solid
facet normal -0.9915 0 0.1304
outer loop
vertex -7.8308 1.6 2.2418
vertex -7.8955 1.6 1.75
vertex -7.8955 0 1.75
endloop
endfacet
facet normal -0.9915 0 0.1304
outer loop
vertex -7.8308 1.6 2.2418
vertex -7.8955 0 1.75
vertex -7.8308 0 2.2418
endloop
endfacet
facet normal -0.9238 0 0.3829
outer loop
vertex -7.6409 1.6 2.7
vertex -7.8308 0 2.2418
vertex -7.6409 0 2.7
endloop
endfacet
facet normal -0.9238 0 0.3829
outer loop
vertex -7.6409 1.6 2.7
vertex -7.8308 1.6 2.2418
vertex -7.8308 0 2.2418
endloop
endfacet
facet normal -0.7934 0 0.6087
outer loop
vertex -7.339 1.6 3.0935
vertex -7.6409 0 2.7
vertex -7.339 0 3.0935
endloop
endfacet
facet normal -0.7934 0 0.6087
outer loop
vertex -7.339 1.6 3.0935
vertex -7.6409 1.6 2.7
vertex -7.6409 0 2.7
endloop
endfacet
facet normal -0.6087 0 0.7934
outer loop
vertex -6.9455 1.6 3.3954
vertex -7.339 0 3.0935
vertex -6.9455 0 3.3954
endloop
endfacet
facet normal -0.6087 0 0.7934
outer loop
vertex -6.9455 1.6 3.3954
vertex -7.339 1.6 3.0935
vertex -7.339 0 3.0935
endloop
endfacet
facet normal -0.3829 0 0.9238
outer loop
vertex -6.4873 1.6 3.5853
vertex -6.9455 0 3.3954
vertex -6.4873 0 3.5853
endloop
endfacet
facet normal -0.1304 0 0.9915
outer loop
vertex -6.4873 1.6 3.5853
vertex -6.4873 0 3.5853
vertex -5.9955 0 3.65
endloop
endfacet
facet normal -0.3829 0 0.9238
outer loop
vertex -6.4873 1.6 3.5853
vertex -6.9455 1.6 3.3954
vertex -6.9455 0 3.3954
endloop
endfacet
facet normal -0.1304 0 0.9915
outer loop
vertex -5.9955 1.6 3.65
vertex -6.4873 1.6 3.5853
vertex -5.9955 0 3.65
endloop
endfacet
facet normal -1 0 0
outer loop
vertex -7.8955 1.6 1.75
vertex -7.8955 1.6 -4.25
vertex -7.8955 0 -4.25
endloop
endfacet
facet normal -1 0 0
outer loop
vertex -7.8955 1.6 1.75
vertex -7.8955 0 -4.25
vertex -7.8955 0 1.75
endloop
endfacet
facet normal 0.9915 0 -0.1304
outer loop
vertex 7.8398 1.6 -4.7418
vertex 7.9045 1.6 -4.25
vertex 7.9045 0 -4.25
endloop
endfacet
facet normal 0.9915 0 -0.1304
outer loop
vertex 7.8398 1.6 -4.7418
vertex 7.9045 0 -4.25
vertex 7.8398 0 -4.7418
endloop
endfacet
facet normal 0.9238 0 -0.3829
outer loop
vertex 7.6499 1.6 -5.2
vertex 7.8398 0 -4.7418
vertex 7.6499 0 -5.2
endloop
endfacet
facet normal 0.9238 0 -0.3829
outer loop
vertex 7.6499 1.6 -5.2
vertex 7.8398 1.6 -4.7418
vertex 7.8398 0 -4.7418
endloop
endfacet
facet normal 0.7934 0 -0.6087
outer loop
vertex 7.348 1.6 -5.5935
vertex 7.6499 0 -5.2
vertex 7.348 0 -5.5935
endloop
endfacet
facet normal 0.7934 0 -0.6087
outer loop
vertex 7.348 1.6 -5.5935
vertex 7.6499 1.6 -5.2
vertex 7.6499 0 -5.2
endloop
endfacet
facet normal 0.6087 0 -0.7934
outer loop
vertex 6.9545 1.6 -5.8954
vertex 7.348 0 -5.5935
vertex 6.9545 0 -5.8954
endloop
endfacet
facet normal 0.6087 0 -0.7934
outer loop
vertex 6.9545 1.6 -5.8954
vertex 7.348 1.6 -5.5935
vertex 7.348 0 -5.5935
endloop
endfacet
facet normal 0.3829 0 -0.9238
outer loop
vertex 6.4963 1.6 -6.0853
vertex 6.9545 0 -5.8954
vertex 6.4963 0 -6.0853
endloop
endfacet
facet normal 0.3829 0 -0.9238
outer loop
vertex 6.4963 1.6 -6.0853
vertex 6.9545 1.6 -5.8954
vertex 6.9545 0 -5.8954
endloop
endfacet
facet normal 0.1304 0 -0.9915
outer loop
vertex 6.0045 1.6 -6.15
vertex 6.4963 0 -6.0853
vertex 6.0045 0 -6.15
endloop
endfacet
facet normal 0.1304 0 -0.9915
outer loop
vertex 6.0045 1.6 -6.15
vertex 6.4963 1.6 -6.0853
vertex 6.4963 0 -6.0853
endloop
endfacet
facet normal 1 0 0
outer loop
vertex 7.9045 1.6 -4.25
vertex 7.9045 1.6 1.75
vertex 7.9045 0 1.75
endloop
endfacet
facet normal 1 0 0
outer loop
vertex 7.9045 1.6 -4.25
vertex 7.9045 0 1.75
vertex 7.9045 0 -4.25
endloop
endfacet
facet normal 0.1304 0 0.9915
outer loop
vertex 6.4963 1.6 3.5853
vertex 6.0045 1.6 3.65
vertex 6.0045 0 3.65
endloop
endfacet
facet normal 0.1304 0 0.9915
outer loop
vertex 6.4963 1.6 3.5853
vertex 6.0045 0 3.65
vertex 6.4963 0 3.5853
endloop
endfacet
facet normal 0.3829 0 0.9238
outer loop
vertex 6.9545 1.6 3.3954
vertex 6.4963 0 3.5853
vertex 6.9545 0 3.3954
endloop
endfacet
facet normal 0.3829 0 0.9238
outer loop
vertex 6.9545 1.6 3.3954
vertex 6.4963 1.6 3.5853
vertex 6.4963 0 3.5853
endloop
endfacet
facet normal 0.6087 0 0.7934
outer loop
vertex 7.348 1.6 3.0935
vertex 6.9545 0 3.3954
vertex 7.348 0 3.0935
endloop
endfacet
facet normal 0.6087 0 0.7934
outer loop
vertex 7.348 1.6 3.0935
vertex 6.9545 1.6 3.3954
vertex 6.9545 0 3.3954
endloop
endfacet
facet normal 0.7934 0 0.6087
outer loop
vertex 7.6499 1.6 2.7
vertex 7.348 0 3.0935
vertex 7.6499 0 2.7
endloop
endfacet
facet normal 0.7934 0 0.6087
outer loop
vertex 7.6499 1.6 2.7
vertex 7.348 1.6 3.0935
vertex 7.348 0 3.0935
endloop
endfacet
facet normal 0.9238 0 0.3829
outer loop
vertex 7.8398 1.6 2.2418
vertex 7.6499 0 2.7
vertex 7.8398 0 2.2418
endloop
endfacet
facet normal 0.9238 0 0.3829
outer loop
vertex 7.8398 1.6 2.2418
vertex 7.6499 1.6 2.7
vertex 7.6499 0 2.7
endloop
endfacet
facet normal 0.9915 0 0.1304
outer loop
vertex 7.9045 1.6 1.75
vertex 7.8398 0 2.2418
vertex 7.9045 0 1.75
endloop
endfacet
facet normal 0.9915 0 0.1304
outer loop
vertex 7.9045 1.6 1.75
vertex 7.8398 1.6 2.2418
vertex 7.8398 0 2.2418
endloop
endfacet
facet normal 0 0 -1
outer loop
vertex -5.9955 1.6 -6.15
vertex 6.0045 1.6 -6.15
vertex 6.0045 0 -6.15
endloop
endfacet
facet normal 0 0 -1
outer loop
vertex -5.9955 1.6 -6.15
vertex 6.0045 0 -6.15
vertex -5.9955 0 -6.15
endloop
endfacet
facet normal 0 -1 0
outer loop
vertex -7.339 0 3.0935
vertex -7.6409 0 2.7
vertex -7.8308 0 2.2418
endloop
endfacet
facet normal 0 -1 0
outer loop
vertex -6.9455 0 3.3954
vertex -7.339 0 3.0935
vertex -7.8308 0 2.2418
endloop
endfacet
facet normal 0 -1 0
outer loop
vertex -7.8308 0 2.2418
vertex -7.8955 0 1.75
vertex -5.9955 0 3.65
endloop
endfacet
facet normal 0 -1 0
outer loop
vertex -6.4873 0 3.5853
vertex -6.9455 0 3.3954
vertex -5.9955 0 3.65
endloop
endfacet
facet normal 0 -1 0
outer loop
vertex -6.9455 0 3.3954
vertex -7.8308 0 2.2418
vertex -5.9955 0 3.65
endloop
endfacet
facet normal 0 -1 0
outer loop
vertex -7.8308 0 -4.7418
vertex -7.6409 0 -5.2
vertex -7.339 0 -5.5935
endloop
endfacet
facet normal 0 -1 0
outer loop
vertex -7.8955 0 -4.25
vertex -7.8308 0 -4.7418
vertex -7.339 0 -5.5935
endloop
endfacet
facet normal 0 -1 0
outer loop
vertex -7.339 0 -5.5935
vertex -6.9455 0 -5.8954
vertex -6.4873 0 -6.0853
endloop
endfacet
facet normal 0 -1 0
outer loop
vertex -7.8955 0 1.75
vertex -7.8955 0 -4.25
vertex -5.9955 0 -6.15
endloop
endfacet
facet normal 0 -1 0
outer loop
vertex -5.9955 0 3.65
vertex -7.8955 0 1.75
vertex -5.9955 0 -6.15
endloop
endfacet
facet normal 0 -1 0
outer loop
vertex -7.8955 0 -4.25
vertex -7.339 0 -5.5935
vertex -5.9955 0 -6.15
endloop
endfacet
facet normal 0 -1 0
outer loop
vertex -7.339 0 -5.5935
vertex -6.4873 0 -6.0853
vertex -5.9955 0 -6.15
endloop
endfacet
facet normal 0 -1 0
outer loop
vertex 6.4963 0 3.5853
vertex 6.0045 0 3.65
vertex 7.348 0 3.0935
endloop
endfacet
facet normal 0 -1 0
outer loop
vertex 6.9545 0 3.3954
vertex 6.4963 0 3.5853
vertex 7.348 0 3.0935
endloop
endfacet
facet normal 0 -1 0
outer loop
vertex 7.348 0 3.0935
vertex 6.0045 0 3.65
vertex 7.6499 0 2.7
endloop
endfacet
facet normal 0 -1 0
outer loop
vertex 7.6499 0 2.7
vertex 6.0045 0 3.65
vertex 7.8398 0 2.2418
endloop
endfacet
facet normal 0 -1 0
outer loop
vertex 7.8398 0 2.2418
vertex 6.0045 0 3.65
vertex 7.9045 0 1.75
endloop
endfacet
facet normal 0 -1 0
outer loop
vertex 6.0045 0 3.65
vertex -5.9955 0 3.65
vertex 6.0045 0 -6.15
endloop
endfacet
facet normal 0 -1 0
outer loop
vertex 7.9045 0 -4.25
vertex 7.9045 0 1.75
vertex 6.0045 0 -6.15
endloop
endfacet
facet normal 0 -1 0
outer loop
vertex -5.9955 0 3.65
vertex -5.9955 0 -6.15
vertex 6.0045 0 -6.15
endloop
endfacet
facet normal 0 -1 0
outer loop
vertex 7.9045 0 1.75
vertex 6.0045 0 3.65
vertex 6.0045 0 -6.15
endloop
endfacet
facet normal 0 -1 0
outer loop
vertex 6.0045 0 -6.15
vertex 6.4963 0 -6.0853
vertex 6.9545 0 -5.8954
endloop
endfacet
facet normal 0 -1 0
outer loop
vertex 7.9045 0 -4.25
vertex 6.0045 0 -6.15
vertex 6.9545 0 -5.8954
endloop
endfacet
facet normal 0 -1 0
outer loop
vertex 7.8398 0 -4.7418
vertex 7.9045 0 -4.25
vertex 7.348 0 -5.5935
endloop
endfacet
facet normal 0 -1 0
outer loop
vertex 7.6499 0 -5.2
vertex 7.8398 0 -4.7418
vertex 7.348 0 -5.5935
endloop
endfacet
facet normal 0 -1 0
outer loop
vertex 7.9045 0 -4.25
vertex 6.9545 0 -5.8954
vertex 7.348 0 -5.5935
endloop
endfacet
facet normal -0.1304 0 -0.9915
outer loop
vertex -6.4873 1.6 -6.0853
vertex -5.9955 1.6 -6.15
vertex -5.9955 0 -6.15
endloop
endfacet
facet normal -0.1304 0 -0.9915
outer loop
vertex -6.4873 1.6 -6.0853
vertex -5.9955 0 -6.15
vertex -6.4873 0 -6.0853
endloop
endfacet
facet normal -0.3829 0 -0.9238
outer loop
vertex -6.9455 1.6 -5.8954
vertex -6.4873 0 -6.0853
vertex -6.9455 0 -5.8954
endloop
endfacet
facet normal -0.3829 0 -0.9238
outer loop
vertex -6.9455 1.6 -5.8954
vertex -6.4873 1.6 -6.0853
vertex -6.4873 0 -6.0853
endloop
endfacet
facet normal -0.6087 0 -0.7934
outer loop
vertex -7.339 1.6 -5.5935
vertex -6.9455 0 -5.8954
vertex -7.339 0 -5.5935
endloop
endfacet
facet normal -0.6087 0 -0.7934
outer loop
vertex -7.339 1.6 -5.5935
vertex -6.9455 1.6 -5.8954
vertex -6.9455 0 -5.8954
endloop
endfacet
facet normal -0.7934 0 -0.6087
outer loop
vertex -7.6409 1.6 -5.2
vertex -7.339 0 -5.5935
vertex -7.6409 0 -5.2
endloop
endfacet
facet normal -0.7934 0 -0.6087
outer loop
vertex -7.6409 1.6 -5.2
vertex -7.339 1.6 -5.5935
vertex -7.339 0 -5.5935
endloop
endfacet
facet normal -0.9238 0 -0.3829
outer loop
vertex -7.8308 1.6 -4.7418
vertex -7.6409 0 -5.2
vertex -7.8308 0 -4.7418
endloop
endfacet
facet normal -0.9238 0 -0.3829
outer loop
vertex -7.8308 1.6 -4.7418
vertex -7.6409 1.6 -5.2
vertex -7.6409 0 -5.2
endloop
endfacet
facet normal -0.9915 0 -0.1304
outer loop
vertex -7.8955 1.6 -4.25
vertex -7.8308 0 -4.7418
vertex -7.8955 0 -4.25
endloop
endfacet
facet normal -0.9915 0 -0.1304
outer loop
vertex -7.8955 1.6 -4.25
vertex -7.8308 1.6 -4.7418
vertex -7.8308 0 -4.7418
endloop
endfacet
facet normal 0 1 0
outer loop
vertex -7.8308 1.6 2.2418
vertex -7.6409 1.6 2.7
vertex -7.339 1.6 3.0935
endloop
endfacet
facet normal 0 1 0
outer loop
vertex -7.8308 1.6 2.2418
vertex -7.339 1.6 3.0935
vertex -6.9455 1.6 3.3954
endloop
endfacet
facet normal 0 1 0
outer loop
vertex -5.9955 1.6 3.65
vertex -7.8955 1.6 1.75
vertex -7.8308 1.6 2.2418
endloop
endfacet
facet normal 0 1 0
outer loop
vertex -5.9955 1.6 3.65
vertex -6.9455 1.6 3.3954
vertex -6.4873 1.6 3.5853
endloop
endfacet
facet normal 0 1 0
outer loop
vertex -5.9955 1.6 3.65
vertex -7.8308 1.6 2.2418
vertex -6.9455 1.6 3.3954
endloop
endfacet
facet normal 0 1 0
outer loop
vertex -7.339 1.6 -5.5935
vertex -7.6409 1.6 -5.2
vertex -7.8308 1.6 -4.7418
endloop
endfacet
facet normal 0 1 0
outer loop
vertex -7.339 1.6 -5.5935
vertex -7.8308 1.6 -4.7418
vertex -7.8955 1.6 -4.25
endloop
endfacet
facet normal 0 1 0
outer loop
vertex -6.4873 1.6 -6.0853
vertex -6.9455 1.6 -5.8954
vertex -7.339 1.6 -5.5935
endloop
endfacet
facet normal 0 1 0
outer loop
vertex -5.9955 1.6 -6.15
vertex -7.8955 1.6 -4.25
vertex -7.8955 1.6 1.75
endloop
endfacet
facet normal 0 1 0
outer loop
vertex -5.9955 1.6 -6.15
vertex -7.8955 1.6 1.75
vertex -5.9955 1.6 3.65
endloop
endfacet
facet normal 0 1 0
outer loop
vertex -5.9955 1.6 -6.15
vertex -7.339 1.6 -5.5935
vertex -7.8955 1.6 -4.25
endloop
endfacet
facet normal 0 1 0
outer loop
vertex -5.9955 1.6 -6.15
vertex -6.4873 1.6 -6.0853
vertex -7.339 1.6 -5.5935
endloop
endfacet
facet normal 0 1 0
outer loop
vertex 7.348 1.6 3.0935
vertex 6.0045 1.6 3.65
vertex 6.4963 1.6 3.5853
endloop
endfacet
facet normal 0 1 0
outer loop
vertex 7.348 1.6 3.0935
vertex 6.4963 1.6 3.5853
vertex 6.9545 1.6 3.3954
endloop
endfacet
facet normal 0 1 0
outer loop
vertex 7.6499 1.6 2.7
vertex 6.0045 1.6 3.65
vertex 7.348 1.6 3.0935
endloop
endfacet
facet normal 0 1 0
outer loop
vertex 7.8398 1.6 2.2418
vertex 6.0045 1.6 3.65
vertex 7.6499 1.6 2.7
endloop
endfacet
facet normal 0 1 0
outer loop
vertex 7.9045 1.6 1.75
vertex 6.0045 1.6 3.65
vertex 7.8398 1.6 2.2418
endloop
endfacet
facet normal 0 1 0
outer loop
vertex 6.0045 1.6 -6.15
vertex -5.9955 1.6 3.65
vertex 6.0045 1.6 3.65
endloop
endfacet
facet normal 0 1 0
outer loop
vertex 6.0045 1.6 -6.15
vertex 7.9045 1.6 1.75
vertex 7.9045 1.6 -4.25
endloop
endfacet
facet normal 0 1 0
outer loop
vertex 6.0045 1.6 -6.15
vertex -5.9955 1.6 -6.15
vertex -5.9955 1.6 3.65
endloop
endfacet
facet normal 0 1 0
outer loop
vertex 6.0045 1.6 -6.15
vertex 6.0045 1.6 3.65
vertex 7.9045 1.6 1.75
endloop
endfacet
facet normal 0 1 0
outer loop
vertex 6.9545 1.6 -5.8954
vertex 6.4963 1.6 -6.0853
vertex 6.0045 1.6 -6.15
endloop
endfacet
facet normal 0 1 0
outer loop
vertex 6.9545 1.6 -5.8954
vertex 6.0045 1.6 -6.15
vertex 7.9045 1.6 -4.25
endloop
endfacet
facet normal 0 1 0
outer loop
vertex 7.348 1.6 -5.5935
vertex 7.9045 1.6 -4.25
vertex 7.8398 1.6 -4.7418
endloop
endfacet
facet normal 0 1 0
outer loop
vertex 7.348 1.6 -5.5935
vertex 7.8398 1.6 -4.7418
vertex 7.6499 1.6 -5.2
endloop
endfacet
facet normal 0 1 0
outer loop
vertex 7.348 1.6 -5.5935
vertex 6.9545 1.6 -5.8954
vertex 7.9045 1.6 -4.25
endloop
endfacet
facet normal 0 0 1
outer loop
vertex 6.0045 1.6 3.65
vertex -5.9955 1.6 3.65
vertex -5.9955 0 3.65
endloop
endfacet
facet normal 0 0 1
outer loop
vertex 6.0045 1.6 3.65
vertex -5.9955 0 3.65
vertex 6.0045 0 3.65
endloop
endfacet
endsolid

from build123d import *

# Parameters (mm, degrees)
SKETCH1_W           = 16
SKETCH1_H           = 16
BOSS_EXTRUDE1_DEPTH = 1.6
SKETCH2_OUTSIDE_W   = 22.536
SKETCH2_OUTSIDE_H   = 22.536
CUT_EXTRUDE1_DEPTH  = 1.6


with BuildPart() as part:
    # Sketch1 → Boss-Extrude1 (new body)
    with BuildSketch(Plane(origin=(0, 0, 0), x_dir=(1, 0, 0), z_dir=(0, 1, 0))):
        Rectangle(SKETCH1_W, SKETCH1_H)
    extrude(amount=BOSS_EXTRUDE1_DEPTH)

    # Sketch2 outside → Cut-Extrude1 (cut)
    with BuildSketch(Plane(origin=(0, 1.6, 0), x_dir=(1, 0, 0), z_dir=(0, 1, 0))):
        Rectangle(SKETCH2_OUTSIDE_W, SKETCH2_OUTSIDE_H)
        with BuildLine():
            Line((6.0045, 6.15), (-5.9955, 6.15))
            ThreePointArc((-5.9955, 6.15), (-7.339002884, 5.593502884), (-7.8955, 4.25))
            Line((-7.8955, 4.25), (-7.8955, -1.75))
            ThreePointArc((-7.8955, -1.75), (-7.339002884, -3.093502884), (-5.9955, -3.65))
            Line((-5.9955, -3.65), (6.0045, -3.65))
            ThreePointArc((6.0045, -3.65), (7.348002884, -3.093502884), (7.9045, -1.75))
            Line((7.9045, -1.75), (7.9045, 4.25))
            ThreePointArc((7.9045, 4.25), (7.348002884, 5.593502884), (6.0045, 6.15))
        make_face(mode=Mode.SUBTRACT)
    extrude(amount=-CUT_EXTRUDE1_DEPTH, mode=Mode.SUBTRACT)


solid = part.part
